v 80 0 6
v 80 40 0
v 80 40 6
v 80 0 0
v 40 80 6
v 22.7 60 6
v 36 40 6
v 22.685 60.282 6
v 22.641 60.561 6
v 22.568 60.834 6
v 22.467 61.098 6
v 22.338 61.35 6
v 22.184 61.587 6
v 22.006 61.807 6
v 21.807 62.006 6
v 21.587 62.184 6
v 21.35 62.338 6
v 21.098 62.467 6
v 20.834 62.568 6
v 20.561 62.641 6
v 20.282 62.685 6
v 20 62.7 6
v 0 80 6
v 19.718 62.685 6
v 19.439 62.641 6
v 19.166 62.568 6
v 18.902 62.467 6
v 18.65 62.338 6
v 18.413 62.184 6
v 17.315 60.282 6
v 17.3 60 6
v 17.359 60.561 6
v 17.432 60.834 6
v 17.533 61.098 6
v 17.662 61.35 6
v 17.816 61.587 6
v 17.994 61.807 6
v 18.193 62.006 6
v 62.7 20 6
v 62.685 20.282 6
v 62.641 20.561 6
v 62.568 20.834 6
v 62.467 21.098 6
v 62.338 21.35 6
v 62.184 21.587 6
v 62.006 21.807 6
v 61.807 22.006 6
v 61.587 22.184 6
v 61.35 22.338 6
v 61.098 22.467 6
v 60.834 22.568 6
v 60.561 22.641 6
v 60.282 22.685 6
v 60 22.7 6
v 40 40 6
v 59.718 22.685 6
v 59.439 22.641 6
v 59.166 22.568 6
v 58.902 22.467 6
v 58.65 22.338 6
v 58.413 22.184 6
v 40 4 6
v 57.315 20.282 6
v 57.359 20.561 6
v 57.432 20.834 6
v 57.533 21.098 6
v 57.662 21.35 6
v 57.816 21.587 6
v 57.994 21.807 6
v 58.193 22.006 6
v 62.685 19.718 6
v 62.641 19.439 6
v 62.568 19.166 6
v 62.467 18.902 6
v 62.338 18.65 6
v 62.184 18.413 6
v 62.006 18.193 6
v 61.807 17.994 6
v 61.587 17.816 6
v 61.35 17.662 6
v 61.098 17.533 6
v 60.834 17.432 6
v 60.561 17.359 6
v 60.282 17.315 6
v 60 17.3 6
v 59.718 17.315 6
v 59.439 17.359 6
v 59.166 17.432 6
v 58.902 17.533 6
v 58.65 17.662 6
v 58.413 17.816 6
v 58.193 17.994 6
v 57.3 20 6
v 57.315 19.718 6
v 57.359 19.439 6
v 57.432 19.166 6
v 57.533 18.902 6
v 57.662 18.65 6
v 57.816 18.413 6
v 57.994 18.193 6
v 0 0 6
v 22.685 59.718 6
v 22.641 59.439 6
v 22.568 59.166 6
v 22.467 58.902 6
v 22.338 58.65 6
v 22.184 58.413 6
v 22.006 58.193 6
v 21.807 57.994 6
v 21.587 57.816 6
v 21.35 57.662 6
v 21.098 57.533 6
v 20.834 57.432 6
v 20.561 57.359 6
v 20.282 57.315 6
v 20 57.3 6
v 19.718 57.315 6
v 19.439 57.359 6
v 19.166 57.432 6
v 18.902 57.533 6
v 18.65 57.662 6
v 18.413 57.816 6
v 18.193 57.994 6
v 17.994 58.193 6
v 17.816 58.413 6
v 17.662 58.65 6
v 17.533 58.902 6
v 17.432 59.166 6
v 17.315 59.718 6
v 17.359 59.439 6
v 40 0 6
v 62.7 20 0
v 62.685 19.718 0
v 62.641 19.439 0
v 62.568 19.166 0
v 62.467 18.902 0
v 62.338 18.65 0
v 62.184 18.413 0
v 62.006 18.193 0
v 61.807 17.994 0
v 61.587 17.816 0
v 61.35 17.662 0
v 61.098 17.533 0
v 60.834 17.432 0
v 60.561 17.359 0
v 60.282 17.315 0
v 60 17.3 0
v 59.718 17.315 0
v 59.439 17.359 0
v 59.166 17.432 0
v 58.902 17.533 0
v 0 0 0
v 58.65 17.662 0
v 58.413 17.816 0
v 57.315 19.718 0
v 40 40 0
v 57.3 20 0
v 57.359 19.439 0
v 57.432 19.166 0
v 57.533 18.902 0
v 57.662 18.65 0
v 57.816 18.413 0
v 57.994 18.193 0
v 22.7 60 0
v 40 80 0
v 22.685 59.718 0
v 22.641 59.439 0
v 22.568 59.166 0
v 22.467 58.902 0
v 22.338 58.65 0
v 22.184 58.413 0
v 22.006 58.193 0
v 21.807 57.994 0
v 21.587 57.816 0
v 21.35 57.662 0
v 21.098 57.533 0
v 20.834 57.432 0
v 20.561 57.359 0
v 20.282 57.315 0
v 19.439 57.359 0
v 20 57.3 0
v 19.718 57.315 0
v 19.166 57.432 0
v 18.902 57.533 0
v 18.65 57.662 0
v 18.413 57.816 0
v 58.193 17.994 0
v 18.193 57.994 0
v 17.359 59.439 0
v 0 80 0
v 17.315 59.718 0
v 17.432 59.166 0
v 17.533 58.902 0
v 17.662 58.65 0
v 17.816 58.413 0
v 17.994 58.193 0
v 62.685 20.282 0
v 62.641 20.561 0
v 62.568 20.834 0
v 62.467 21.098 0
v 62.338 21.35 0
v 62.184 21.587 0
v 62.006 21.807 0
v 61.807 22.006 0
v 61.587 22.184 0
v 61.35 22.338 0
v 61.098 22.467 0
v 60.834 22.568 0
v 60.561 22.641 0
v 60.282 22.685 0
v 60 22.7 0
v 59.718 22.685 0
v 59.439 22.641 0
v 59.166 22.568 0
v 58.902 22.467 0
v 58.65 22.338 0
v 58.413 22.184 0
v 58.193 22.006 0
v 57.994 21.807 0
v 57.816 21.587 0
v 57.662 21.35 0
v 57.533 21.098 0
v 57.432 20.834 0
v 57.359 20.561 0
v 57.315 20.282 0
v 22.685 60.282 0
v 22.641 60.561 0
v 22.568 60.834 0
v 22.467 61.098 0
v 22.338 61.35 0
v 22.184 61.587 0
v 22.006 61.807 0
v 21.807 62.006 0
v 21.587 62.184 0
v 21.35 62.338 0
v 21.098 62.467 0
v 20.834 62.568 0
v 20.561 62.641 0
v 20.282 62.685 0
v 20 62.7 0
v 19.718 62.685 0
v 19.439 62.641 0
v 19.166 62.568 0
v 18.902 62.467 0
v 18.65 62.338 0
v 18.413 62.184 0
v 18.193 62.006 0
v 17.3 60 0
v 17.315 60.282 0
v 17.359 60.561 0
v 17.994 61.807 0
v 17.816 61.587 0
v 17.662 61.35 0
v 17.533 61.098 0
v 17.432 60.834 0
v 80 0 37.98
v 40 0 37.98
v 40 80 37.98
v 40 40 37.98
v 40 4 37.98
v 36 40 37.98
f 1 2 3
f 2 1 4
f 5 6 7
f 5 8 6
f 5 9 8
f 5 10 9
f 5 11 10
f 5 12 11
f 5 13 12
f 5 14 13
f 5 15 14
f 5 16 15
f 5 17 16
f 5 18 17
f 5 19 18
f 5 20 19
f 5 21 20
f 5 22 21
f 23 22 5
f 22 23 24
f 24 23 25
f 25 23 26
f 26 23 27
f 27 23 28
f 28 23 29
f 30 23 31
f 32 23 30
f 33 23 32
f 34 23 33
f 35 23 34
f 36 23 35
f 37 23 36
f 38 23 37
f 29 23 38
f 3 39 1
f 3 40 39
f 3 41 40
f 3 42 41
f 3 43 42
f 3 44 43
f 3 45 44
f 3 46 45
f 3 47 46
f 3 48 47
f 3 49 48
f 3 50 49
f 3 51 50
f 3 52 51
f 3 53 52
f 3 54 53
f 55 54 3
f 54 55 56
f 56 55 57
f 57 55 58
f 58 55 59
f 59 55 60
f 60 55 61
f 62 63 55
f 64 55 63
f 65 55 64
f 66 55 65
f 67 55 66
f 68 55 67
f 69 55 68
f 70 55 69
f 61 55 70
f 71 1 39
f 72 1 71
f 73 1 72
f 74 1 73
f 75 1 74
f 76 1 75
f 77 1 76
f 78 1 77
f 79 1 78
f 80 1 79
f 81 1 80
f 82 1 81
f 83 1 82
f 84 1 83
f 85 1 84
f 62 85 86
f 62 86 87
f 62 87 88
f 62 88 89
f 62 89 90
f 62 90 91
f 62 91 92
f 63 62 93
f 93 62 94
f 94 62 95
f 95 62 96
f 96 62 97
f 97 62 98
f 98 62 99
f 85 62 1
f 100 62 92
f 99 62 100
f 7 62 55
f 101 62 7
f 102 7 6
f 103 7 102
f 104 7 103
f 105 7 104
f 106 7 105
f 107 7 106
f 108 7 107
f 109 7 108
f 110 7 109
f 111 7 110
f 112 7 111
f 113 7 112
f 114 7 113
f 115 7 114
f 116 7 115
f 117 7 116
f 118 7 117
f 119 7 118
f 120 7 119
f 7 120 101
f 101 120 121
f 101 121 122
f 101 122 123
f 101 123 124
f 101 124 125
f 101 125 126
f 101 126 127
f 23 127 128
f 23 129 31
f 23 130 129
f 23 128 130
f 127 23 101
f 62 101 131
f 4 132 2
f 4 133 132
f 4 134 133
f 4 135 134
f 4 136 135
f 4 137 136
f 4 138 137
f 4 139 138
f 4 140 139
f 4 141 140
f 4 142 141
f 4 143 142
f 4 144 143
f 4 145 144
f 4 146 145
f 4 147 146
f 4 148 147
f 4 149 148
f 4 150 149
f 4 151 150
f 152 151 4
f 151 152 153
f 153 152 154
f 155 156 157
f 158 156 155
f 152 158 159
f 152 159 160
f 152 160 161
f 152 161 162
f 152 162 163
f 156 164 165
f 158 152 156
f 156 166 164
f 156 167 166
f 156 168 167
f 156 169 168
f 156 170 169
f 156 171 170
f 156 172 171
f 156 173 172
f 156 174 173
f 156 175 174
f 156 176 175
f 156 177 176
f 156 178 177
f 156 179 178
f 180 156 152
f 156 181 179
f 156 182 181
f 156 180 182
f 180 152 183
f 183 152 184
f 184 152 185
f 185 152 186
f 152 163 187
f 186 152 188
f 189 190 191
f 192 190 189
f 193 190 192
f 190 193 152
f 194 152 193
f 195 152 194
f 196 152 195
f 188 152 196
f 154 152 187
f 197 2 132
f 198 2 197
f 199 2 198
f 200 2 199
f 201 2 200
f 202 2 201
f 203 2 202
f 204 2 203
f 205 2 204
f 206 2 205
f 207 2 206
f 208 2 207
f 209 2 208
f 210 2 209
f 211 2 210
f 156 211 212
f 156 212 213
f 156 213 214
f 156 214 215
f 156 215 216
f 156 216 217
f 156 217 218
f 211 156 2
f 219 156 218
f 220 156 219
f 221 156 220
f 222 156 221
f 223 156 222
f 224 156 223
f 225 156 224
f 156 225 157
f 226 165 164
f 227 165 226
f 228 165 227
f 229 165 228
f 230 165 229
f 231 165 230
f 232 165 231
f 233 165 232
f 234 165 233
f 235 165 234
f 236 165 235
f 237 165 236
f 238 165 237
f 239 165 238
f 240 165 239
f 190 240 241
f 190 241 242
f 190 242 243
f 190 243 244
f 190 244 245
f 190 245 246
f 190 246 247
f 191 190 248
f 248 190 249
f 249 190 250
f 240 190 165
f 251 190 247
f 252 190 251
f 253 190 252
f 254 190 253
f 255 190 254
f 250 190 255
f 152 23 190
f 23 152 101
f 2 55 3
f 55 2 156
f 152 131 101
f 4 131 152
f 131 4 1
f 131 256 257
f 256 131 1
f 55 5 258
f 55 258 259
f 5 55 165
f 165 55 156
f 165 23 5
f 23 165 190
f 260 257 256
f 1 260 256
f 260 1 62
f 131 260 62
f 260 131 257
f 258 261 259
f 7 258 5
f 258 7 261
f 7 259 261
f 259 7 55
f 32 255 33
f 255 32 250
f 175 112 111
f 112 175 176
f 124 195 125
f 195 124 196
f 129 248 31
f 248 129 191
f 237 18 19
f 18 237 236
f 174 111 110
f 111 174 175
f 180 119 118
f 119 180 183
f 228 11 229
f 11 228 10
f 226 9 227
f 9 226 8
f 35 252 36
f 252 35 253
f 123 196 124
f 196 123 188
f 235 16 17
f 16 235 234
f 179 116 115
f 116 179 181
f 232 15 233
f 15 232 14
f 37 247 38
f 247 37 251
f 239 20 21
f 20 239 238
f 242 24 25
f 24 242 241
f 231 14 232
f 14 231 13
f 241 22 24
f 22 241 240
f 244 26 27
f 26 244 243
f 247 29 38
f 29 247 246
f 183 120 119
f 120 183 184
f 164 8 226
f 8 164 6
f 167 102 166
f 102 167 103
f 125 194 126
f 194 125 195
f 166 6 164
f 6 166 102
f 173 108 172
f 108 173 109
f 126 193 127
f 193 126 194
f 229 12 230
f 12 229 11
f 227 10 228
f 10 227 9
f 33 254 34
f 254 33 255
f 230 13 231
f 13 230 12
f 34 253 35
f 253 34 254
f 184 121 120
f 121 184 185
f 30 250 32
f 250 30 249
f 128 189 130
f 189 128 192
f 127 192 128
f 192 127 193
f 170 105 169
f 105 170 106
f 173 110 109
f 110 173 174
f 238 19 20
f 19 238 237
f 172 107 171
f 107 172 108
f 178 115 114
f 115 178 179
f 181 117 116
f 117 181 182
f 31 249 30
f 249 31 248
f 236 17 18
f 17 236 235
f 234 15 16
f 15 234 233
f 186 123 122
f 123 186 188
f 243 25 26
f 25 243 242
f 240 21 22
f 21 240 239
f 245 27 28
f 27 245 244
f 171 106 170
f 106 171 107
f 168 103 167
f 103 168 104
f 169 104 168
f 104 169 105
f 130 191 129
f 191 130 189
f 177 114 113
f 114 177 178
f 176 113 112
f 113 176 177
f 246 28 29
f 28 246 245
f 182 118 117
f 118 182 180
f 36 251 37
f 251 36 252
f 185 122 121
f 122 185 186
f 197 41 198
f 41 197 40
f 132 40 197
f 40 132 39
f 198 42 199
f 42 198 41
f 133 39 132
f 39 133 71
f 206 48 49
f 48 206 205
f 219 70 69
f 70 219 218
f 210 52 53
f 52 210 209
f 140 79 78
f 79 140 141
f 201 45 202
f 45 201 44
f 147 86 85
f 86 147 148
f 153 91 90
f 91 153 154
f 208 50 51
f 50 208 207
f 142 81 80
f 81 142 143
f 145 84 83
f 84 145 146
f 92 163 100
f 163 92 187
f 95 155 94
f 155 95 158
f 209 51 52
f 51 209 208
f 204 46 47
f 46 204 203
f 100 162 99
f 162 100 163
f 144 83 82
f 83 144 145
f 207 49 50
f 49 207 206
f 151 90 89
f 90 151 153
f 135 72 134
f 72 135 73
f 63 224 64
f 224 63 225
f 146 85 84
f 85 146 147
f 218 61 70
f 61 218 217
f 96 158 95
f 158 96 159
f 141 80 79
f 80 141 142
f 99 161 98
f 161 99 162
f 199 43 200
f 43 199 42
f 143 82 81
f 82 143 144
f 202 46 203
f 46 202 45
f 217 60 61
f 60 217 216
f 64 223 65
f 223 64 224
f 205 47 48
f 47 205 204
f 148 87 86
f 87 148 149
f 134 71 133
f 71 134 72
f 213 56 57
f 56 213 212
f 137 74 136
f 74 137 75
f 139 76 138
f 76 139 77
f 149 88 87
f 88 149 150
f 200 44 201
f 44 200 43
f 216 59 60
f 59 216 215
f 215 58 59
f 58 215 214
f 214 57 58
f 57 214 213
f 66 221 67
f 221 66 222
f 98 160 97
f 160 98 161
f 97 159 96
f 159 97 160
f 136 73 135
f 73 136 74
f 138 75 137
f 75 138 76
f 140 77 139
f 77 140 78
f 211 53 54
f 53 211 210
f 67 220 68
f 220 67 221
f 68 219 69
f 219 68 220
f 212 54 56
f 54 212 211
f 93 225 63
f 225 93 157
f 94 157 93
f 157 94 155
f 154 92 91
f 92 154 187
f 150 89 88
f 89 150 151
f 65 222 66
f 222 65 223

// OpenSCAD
// Reinforced right-angle gusset for 40 mm profile.
$fn = 60;
eps = 0.02;
profile = 40;
arm = 80;
plate_t = 6;
rib_t = 4;
rib_h = 32;
module rib_x() {
    translate([profile, 0, plate_t - eps]) linear_extrude(height = rib_h)
        polygon(points = [[0, 0], [arm - profile, 0], [0, rib_t]]);
}
module rib_y() {
    translate([profile, profile, plate_t - eps]) rotate([0, 0, 90]) linear_extrude(height = rib_h)
        polygon(points = [[0, 0], [arm - profile, 0], [0, rib_t]]);
}
difference() {
    union() { cube([arm, profile, plate_t]); cube([profile, arm, plate_t]); rib_x(); rib_y(); }
    for (p = [[profile / 2, arm - profile / 2], [arm - profile / 2, profile / 2]])
        translate([p[0], p[1], -eps]) cylinder(d = 5.4, h = plate_t + 2 * eps);
}
